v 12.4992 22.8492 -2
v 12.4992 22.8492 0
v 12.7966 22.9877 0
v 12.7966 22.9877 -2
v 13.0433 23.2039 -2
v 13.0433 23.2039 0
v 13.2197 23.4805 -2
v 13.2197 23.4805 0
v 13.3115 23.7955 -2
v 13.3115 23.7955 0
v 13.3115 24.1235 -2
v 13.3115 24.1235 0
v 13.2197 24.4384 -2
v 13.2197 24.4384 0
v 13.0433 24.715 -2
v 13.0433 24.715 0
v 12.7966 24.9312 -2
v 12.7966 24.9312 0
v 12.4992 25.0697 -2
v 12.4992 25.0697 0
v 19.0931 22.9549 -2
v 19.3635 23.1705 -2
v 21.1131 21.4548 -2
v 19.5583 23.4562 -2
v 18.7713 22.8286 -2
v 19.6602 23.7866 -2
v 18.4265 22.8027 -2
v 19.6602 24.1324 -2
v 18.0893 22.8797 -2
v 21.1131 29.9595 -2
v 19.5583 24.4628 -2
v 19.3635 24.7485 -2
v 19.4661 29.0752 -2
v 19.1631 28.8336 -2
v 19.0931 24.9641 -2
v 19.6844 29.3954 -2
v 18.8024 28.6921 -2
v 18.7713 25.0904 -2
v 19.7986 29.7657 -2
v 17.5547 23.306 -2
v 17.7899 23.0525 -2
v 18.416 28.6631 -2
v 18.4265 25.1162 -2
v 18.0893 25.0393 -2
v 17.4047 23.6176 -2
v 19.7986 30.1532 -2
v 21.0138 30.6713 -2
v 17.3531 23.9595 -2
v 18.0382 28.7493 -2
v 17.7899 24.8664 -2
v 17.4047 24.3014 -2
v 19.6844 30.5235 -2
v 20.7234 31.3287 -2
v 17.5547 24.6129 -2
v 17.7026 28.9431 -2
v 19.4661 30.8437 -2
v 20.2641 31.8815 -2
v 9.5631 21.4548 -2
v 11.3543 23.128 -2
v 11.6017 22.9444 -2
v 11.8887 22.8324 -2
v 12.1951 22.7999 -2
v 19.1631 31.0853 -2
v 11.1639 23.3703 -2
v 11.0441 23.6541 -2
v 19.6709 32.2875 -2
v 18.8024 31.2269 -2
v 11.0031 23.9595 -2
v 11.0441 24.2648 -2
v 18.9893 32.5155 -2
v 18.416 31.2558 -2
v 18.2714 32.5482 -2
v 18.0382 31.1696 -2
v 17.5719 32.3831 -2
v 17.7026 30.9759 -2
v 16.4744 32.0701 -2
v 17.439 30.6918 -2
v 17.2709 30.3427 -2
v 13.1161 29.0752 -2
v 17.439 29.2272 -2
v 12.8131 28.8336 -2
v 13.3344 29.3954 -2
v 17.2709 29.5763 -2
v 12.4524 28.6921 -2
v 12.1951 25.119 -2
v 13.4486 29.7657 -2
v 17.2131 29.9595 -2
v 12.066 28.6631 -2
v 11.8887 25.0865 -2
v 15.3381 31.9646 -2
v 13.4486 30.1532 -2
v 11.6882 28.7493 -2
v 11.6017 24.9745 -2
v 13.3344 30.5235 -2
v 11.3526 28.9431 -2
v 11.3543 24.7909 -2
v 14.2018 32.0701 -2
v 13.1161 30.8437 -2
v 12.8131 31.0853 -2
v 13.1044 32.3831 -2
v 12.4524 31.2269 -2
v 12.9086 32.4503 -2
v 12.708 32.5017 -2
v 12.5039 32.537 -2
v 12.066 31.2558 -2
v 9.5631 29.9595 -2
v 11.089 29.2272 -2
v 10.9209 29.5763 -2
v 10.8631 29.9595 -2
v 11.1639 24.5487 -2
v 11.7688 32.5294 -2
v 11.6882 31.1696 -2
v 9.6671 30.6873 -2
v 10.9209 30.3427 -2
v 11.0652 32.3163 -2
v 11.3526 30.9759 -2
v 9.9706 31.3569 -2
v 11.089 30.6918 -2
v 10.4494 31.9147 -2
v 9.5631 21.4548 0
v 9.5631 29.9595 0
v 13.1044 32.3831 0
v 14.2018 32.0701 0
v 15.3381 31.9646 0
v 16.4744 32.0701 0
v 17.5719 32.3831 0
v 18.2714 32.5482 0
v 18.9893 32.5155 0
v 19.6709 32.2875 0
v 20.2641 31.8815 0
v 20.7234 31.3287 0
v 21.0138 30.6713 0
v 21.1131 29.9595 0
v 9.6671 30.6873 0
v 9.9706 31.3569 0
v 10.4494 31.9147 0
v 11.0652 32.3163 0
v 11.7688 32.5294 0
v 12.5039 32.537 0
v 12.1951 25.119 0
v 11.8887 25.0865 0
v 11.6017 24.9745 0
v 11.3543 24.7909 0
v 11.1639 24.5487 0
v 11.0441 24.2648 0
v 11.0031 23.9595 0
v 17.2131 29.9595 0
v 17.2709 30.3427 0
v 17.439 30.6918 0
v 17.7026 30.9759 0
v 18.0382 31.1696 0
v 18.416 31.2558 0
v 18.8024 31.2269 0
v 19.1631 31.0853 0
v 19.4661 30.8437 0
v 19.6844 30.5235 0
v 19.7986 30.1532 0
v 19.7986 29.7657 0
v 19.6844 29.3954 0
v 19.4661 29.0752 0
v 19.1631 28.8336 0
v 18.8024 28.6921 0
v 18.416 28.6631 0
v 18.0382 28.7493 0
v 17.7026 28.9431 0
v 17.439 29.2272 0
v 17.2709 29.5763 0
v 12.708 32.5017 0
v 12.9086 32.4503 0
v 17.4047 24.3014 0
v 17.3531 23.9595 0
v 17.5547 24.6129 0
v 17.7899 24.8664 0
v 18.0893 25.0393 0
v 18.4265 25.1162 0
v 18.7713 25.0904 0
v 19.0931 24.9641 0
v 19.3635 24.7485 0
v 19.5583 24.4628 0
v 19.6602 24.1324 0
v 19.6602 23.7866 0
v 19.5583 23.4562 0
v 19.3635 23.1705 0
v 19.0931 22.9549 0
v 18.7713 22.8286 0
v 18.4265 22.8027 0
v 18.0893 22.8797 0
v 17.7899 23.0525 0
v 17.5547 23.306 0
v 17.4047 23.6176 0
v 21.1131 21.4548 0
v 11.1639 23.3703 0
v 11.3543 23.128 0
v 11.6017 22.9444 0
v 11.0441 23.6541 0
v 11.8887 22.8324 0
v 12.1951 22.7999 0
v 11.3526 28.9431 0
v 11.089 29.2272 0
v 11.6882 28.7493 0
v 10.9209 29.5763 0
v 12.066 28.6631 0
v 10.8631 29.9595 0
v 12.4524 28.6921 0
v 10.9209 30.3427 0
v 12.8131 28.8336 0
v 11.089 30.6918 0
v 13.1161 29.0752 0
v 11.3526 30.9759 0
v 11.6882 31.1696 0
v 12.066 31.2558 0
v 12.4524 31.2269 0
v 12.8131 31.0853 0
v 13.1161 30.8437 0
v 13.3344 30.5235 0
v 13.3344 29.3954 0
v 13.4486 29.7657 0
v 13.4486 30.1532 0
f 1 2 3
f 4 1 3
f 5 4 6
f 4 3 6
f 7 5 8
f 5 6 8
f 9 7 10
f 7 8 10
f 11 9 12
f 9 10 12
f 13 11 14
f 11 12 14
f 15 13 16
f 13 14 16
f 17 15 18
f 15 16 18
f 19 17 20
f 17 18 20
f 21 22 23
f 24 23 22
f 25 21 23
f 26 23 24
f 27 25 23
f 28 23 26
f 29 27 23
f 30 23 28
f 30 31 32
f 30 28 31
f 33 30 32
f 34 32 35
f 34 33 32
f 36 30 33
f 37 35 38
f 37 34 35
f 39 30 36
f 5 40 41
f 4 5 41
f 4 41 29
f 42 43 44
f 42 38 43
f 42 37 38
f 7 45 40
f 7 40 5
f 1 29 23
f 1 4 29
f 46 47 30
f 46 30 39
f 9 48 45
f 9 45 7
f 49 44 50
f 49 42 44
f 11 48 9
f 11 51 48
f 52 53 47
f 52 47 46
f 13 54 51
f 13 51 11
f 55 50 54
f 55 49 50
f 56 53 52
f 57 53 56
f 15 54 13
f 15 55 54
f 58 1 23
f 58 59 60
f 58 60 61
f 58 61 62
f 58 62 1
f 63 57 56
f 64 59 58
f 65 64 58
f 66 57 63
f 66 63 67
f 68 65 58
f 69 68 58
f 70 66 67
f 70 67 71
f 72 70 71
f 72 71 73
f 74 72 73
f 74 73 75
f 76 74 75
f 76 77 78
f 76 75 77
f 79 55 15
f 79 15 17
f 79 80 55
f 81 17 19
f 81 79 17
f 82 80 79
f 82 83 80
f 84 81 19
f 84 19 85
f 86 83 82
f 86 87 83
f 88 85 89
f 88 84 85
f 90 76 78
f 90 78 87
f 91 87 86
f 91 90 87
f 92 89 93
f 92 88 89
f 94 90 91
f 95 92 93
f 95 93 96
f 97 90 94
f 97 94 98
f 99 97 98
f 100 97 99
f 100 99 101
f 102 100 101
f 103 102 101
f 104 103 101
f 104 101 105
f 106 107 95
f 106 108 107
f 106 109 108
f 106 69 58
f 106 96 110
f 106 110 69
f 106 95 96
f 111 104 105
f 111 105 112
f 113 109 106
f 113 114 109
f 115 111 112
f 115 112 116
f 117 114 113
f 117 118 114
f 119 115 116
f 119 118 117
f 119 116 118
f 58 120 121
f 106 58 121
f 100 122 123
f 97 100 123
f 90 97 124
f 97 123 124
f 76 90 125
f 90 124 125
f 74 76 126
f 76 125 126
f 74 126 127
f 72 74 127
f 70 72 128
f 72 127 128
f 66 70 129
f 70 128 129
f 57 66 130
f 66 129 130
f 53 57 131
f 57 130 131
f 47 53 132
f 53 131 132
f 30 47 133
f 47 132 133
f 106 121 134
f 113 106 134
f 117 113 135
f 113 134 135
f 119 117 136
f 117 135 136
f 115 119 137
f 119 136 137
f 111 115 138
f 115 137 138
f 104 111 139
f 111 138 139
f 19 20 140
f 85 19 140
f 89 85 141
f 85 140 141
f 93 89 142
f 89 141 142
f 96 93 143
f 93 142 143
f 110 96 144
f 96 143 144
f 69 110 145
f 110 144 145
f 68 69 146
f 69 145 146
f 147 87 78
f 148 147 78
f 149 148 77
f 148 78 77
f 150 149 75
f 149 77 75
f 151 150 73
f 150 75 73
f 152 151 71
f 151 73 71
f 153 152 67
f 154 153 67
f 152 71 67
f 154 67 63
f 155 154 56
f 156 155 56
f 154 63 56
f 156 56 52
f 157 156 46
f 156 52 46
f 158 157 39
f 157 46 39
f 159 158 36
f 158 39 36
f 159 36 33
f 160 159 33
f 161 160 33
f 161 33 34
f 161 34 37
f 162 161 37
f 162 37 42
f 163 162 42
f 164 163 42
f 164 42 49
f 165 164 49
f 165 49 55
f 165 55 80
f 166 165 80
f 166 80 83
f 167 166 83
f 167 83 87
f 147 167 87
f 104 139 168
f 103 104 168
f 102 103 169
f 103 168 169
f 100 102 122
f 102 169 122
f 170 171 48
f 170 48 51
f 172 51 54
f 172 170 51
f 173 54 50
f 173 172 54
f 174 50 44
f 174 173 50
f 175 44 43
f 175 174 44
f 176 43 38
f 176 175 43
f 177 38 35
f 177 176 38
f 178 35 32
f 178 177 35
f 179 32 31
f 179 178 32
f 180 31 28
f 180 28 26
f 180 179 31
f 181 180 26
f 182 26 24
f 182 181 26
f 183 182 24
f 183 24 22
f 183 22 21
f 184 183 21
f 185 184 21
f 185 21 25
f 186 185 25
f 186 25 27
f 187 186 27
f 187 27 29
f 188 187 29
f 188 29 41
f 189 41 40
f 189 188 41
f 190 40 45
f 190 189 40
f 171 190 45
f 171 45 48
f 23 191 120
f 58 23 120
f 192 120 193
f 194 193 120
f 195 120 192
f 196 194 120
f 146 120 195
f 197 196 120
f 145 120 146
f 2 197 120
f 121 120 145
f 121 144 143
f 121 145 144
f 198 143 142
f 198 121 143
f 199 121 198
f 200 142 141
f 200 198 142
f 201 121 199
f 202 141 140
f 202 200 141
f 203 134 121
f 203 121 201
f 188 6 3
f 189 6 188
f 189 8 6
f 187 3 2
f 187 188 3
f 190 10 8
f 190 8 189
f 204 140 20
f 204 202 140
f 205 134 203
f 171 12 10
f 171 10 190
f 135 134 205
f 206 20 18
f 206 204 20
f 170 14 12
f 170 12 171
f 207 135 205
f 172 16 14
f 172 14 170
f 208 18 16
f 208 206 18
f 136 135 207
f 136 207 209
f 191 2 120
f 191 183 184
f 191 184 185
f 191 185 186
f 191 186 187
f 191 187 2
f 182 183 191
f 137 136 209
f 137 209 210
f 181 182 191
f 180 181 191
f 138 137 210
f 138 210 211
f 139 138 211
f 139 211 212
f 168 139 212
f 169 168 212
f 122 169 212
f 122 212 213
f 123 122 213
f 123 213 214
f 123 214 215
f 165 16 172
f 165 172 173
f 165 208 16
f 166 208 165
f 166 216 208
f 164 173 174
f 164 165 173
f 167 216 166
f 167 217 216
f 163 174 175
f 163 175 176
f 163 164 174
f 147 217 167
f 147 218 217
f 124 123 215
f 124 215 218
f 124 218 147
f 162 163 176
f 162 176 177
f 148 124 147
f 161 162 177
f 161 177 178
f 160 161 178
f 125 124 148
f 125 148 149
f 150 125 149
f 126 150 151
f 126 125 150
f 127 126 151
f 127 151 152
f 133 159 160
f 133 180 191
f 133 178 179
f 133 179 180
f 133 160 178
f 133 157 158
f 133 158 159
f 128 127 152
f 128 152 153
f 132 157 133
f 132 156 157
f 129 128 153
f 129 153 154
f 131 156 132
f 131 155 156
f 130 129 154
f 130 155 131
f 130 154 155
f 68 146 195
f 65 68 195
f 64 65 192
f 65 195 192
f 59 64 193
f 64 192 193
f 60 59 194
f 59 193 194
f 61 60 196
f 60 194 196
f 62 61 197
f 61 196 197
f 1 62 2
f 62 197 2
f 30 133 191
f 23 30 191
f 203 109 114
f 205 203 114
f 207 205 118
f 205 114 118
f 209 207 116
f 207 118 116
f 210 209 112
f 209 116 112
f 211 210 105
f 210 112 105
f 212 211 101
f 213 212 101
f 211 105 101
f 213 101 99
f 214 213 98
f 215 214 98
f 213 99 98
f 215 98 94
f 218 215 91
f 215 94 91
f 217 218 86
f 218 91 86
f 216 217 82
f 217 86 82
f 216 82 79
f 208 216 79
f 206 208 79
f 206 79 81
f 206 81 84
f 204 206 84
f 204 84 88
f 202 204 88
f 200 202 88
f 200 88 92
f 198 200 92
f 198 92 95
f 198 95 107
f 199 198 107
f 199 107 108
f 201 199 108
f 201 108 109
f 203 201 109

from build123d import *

# Parameters (mm, degrees)
BOSS_EXTRUDE1_DEPTH = 6.18
SKETCH2_R           = 2.1
CUT_EXTRUDE1_DEPTH  = 45.955560266
FILLET1_R           = 2
SKETCH3_R           = 1.16
BOSS_EXTRUDE2_DEPTH = 2
SKETCH5_W           = 46.23261583
SKETCH5_H           = 41.700006435
CUT_EXTRUDE2_DEPTH  = 6.18
SKETCH9_R           = 1.3
CUT_EXTRUDE3_DEPTH  = 39.857224753


with BuildPart() as part:
    # Sketch1 → Boss-Extrude1 (new body)
    with BuildSketch(Plane.XY):
        Polygon((0, 0), (0, 10), (7.5, 10), (12.499244943, 14.999244943), (12.499244943, 34.4), (24.749244943, 34.4), (24.749244943, 14.999244943), (29.748489886, 10), (37.248489886, 10), (37.248489886, 0), align=None)
    extrude(amount=BOSS_EXTRUDE1_DEPTH)

    # Sketch2 → Cut-Extrude1 (cut, through all)
    with BuildSketch(Plane(origin=(0, 10, 0), x_dir=(1, 0, 0), z_dir=(0, 1, 0))):
        with Locations(Location((3.75, -3.09, 0), (0, 0, 270))):
            Circle(SKETCH2_R)
        with Locations(Location((33.498489886, -3.09, 0), (0, 0, 270))):
            Circle(SKETCH2_R)
    extrude(amount=-CUT_EXTRUDE1_DEPTH, mode=Mode.SUBTRACT)

    # Fillet1
    fillet1_edges = [part.edges().sort_by_distance(p)[0] for p in [
        (0, 5, 0),
        (37.248489886, 5, 0),
        (12.499244943, 34.4, 3.09),
        (24.749244943, 34.4, 3.09),
        (0, 5, 6.18),
        (37.248489886, 5, 6.18),
    ]]
    fillet(fillet1_edges, radius=FILLET1_R)

    # Sketch3 → Boss-Extrude2 (add)
    # profile 1 of 15: a face of its own
    with BuildSketch(Plane(origin=(0, 0, 0), x_dir=(-1, 0, 0), z_dir=(0, 0, -1))):
        with BuildLine():
            Line((-14.76314253, 29.959470635), (-15.91314253, 29.959470635))
            ThreePointArc((-15.91314253, 29.959470635), (-18.51314253, 27.359470635), (-21.11314253, 29.959470635))
            Line((-21.11314253, 29.959470635), (-21.11314253, 21.454771123))
            Line((-21.11314253, 21.454771123), (-12.499244943, 21.454771123))
            Line((-12.499244943, 21.454771123), (-12.499244943, 22.849229594))
            ThreePointArc((-12.499244943, 22.849229594), (-13.32314253, 23.959470635), (-12.499244943, 25.069711675))
            Line((-12.499244943, 25.069711675), (-12.499244943, 27.381286163))
            ThreePointArc((-12.499244943, 27.381286163), (-14.116839829, 28.243933732), (-14.76314253, 29.959470635))
        make_face()
        with Locations((-18.51314253, 23.959470635)):
            Circle(SKETCH3_R, mode=Mode.SUBTRACT)
    # profile 2 of 15: a face of its own
    with BuildSketch(Plane(origin=(0, 0, 0), x_dir=(-1, 0, 0), z_dir=(0, 0, -1))):
        with BuildLine():
            ThreePointArc((-9.56314253, 29.959470635), (-10.447605628, 28.005773335), (-12.499244943, 27.381286163))
            Line((-12.499244943, 27.381286163), (-12.499244943, 25.069711675))
            ThreePointArc((-12.499244943, 25.069711675), (-11.47186791, 24.890995943), (-11.00314253, 23.959470635))
            ThreePointArc((-11.00314253, 23.959470635), (-11.47186791, 23.027945327), (-12.499244943, 22.849229594))
            Line((-12.499244943, 22.849229594), (-12.499244943, 21.454771123))
            Line((-12.499244943, 21.454771123), (-9.56314253, 21.454771123))
            Line((-9.56314253, 21.454771123), (-9.56314253, 29.959470635))
        make_face()
    # profile 3 of 15: a face of its own
    with BuildSketch(Plane(origin=(0, 0, 0), x_dir=(-1, 0, 0), z_dir=(0, 0, -1))):
        with BuildLine():
            Line((-13.31814253, 29.959470635), (-14.76314253, 29.959470635))
            ThreePointArc((-14.76314253, 29.959470635), (-14.116839829, 28.243933732), (-12.499244943, 27.381286163))
            Line((-12.499244943, 27.381286163), (-12.499244943, 28.854454722))
            ThreePointArc((-12.499244943, 28.854454722), (-13.091103544, 29.271783673), (-13.31814253, 29.959470635))
        make_face()
    # profile 4 of 15: a face of its own
    with BuildSketch(Plane(origin=(0, 0, 0), x_dir=(-1, 0, 0), z_dir=(0, 0, -1))):
        with BuildLine():
            Line((-12.499244943, 28.854454722), (-12.499244943, 27.381286163))
            ThreePointArc((-12.499244943, 27.381286163), (-10.447605628, 28.005773335), (-9.56314253, 29.959470635))
            Line((-9.56314253, 29.959470635), (-11.00814253, 29.959470635))
            ThreePointArc((-11.00814253, 29.959470635), (-11.475455569, 29.031509621), (-12.499244943, 28.854454722))
        make_face()
    # profile 5 of 15: a face of its own
    with BuildSketch(Plane(origin=(0, 0, 0), x_dir=(-1, 0, 0), z_dir=(0, 0, -1))):
        with BuildLine():
            Line((-13.31814253, 29.959470635), (-14.76314253, 29.959470635))
            ThreePointArc((-14.76314253, 29.959470635), (-14.116839829, 28.243933732), (-12.499244943, 27.381286163))
            Line((-12.499244943, 27.381286163), (-12.499244943, 28.854454722))
            ThreePointArc((-12.499244943, 28.854454722), (-13.091103544, 29.271783673), (-13.31814253, 29.959470635))
        make_face()
    # profile 6 of 15: a face of its own
    with BuildSketch(Plane(origin=(0, 0, 0), x_dir=(-1, 0, 0), z_dir=(0, 0, -1))):
        with BuildLine():
            Line((-12.499244943, 28.854454722), (-12.499244943, 27.381286163))
            ThreePointArc((-12.499244943, 27.381286163), (-10.447605628, 28.005773335), (-9.56314253, 29.959470635))
            Line((-9.56314253, 29.959470635), (-11.00814253, 29.959470635))
            ThreePointArc((-11.00814253, 29.959470635), (-11.475455569, 29.031509621), (-12.499244943, 28.854454722))
        make_face()
    # profile 7 of 15: a face of its own
    with BuildSketch(Plane(origin=(0, 0, 0), x_dir=(-1, 0, 0), z_dir=(0, 0, -1))):
        with BuildLine():
            ThreePointArc((-13.104419545, 32.383103771), (-14.308756689, 31.427918755), (-14.76314253, 29.959470635))
            Line((-14.76314253, 29.959470635), (-13.31814253, 29.959470635))
            ThreePointArc((-13.31814253, 29.959470635), (-13.091103544, 30.647157596), (-12.499244943, 31.064486548))
            Line((-12.499244943, 31.064486548), (-12.499244943, 32.4))
            ThreePointArc((-12.499244943, 32.4), (-12.500420382, 32.468559287), (-12.503945319, 32.537037988))
            ThreePointArc((-12.503945319, 32.537037988), (-12.808786466, 32.478030522), (-13.104419545, 32.383103771))
        make_face()
    # profile 8 of 15: a face of its own
    with BuildSketch(Plane(origin=(0, 0, 0), x_dir=(-1, 0, 0), z_dir=(0, 0, -1))):
        with BuildLine():
            Line((-12.499244943, 32.4), (-12.499244943, 31.064486548))
            ThreePointArc((-12.499244943, 31.064486548), (-11.475455569, 30.887431649), (-11.00814253, 29.959470635))
            Line((-11.00814253, 29.959470635), (-9.56314253, 29.959470635))
            ThreePointArc((-9.56314253, 29.959470635), (-10.449387479, 31.914731135), (-12.503945319, 32.537037988))
            ThreePointArc((-12.503945319, 32.537037988), (-12.500420382, 32.468559287), (-12.499244943, 32.4))
        make_face()
    # profile 9 of 15: a face of its own
    with BuildSketch(Plane(origin=(0, 0, 0), x_dir=(-1, 0, 0), z_dir=(0, 0, -1))):
        with BuildLine():
            ThreePointArc((-13.104419545, 32.383103771), (-14.308756689, 31.427918755), (-14.76314253, 29.959470635))
            Line((-14.76314253, 29.959470635), (-13.31814253, 29.959470635))
            ThreePointArc((-13.31814253, 29.959470635), (-13.091103544, 30.647157596), (-12.499244943, 31.064486548))
            Line((-12.499244943, 31.064486548), (-12.499244943, 32.4))
            ThreePointArc((-12.499244943, 32.4), (-12.500420382, 32.468559287), (-12.503945319, 32.537037988))
            ThreePointArc((-12.503945319, 32.537037988), (-12.808786466, 32.478030522), (-13.104419545, 32.383103771))
        make_face()
    # profile 10 of 15: a face of its own
    with BuildSketch(Plane(origin=(0, 0, 0), x_dir=(-1, 0, 0), z_dir=(0, 0, -1))):
        with BuildLine():
            Line((-12.499244943, 32.4), (-12.499244943, 31.064486548))
            ThreePointArc((-12.499244943, 31.064486548), (-11.475455569, 30.887431649), (-11.00814253, 29.959470635))
            Line((-11.00814253, 29.959470635), (-9.56314253, 29.959470635))
            ThreePointArc((-9.56314253, 29.959470635), (-10.449387479, 31.914731135), (-12.503945319, 32.537037988))
            ThreePointArc((-12.503945319, 32.537037988), (-12.500420382, 32.468559287), (-12.499244943, 32.4))
        make_face()
    # profile 11 of 15: a face of its own
    with BuildSketch(Plane(origin=(0, 0, 0), x_dir=(-1, 0, 0), z_dir=(0, 0, -1))):
        with BuildLine():
            ThreePointArc((-19.66814253, 29.959470635), (-18.51314253, 31.114470635), (-17.35814253, 29.959470635))
            Line((-17.35814253, 29.959470635), (-15.91314253, 29.959470635))
            ThreePointArc((-15.91314253, 29.959470635), (-16.367528354, 31.42791873), (-17.571865459, 32.38310375))
            ThreePointArc((-17.571865459, 32.38310375), (-19.981590625, 32.105084811), (-21.11314253, 29.959470635))
            Line((-21.11314253, 29.959470635), (-19.66814253, 29.959470635))
        make_face()
    # profile 12 of 15: a face of its own
    with BuildSketch(Plane(origin=(0, 0, 0), x_dir=(-1, 0, 0), z_dir=(0, 0, -1))):
        with BuildLine():
            Line((-15.91314253, 29.959470635), (-17.35814253, 29.959470635))
            ThreePointArc((-17.35814253, 29.959470635), (-18.51314253, 28.804470635), (-19.66814253, 29.959470635))
            Line((-19.66814253, 29.959470635), (-21.11314253, 29.959470635))
            ThreePointArc((-21.11314253, 29.959470635), (-18.51314253, 27.359470635), (-15.91314253, 29.959470635))
        make_face()
    # profile 13 of 15: a face of its own
    with BuildSketch(Plane(origin=(0, 0, 0), x_dir=(-1, 0, 0), z_dir=(0, 0, -1))):
        with BuildLine():
            ThreePointArc((-19.66814253, 29.959470635), (-18.51314253, 31.114470635), (-17.35814253, 29.959470635))
            Line((-17.35814253, 29.959470635), (-15.91314253, 29.959470635))
            ThreePointArc((-15.91314253, 29.959470635), (-16.367528354, 31.42791873), (-17.571865459, 32.38310375))
            ThreePointArc((-17.571865459, 32.38310375), (-19.981590625, 32.105084811), (-21.11314253, 29.959470635))
            Line((-21.11314253, 29.959470635), (-19.66814253, 29.959470635))
        make_face()
    # profile 14 of 15: a face of its own
    with BuildSketch(Plane(origin=(0, 0, 0), x_dir=(-1, 0, 0), z_dir=(0, 0, -1))):
        with BuildLine():
            Line((-15.91314253, 29.959470635), (-17.35814253, 29.959470635))
            ThreePointArc((-17.35814253, 29.959470635), (-18.51314253, 28.804470635), (-19.66814253, 29.959470635))
            Line((-19.66814253, 29.959470635), (-21.11314253, 29.959470635))
            ThreePointArc((-21.11314253, 29.959470635), (-18.51314253, 27.359470635), (-15.91314253, 29.959470635))
        make_face()
    # profile 15 of 15: a face of its own
    with BuildSketch(Plane(origin=(0, 0, 0), x_dir=(-1, 0, 0), z_dir=(0, 0, -1))):
        with BuildLine():
            ThreePointArc((-17.571865459, 32.38310375), (-16.367528354, 31.42791873), (-15.91314253, 29.959470635))
            Line((-15.91314253, 29.959470635), (-14.76314253, 29.959470635))
            ThreePointArc((-14.76314253, 29.959470635), (-14.308756689, 31.427918755), (-13.104419545, 32.383103771))
            ThreePointArc((-13.104419545, 32.383103771), (-15.3381425, 31.964571551), (-17.571865459, 32.38310375))
        make_face()
    extrude(amount=BOSS_EXTRUDE2_DEPTH)

    # Sketch5 → Cut-Extrude2 (cut)
    with BuildSketch(Plane.XY.offset(6.18)):
        with Locations((18.136117777, 17.095401322)):
            Rectangle(SKETCH5_W, SKETCH5_H)
    extrude(amount=-CUT_EXTRUDE2_DEPTH, mode=Mode.SUBTRACT)

    # Sketch9 → Cut-Extrude3 (cut, through all)
    with BuildSketch(Plane(origin=(0, 0, -2), x_dir=(-1, 0, 0), z_dir=(0, 0, -1))):
        with Locations((-18.51314253, 29.959470635)):
            Circle(SKETCH9_R)
        with Locations((-12.16314253, 29.959470635)):
            Circle(SKETCH9_R)
    extrude(amount=-CUT_EXTRUDE3_DEPTH, mode=Mode.SUBTRACT)


solid = part.part
